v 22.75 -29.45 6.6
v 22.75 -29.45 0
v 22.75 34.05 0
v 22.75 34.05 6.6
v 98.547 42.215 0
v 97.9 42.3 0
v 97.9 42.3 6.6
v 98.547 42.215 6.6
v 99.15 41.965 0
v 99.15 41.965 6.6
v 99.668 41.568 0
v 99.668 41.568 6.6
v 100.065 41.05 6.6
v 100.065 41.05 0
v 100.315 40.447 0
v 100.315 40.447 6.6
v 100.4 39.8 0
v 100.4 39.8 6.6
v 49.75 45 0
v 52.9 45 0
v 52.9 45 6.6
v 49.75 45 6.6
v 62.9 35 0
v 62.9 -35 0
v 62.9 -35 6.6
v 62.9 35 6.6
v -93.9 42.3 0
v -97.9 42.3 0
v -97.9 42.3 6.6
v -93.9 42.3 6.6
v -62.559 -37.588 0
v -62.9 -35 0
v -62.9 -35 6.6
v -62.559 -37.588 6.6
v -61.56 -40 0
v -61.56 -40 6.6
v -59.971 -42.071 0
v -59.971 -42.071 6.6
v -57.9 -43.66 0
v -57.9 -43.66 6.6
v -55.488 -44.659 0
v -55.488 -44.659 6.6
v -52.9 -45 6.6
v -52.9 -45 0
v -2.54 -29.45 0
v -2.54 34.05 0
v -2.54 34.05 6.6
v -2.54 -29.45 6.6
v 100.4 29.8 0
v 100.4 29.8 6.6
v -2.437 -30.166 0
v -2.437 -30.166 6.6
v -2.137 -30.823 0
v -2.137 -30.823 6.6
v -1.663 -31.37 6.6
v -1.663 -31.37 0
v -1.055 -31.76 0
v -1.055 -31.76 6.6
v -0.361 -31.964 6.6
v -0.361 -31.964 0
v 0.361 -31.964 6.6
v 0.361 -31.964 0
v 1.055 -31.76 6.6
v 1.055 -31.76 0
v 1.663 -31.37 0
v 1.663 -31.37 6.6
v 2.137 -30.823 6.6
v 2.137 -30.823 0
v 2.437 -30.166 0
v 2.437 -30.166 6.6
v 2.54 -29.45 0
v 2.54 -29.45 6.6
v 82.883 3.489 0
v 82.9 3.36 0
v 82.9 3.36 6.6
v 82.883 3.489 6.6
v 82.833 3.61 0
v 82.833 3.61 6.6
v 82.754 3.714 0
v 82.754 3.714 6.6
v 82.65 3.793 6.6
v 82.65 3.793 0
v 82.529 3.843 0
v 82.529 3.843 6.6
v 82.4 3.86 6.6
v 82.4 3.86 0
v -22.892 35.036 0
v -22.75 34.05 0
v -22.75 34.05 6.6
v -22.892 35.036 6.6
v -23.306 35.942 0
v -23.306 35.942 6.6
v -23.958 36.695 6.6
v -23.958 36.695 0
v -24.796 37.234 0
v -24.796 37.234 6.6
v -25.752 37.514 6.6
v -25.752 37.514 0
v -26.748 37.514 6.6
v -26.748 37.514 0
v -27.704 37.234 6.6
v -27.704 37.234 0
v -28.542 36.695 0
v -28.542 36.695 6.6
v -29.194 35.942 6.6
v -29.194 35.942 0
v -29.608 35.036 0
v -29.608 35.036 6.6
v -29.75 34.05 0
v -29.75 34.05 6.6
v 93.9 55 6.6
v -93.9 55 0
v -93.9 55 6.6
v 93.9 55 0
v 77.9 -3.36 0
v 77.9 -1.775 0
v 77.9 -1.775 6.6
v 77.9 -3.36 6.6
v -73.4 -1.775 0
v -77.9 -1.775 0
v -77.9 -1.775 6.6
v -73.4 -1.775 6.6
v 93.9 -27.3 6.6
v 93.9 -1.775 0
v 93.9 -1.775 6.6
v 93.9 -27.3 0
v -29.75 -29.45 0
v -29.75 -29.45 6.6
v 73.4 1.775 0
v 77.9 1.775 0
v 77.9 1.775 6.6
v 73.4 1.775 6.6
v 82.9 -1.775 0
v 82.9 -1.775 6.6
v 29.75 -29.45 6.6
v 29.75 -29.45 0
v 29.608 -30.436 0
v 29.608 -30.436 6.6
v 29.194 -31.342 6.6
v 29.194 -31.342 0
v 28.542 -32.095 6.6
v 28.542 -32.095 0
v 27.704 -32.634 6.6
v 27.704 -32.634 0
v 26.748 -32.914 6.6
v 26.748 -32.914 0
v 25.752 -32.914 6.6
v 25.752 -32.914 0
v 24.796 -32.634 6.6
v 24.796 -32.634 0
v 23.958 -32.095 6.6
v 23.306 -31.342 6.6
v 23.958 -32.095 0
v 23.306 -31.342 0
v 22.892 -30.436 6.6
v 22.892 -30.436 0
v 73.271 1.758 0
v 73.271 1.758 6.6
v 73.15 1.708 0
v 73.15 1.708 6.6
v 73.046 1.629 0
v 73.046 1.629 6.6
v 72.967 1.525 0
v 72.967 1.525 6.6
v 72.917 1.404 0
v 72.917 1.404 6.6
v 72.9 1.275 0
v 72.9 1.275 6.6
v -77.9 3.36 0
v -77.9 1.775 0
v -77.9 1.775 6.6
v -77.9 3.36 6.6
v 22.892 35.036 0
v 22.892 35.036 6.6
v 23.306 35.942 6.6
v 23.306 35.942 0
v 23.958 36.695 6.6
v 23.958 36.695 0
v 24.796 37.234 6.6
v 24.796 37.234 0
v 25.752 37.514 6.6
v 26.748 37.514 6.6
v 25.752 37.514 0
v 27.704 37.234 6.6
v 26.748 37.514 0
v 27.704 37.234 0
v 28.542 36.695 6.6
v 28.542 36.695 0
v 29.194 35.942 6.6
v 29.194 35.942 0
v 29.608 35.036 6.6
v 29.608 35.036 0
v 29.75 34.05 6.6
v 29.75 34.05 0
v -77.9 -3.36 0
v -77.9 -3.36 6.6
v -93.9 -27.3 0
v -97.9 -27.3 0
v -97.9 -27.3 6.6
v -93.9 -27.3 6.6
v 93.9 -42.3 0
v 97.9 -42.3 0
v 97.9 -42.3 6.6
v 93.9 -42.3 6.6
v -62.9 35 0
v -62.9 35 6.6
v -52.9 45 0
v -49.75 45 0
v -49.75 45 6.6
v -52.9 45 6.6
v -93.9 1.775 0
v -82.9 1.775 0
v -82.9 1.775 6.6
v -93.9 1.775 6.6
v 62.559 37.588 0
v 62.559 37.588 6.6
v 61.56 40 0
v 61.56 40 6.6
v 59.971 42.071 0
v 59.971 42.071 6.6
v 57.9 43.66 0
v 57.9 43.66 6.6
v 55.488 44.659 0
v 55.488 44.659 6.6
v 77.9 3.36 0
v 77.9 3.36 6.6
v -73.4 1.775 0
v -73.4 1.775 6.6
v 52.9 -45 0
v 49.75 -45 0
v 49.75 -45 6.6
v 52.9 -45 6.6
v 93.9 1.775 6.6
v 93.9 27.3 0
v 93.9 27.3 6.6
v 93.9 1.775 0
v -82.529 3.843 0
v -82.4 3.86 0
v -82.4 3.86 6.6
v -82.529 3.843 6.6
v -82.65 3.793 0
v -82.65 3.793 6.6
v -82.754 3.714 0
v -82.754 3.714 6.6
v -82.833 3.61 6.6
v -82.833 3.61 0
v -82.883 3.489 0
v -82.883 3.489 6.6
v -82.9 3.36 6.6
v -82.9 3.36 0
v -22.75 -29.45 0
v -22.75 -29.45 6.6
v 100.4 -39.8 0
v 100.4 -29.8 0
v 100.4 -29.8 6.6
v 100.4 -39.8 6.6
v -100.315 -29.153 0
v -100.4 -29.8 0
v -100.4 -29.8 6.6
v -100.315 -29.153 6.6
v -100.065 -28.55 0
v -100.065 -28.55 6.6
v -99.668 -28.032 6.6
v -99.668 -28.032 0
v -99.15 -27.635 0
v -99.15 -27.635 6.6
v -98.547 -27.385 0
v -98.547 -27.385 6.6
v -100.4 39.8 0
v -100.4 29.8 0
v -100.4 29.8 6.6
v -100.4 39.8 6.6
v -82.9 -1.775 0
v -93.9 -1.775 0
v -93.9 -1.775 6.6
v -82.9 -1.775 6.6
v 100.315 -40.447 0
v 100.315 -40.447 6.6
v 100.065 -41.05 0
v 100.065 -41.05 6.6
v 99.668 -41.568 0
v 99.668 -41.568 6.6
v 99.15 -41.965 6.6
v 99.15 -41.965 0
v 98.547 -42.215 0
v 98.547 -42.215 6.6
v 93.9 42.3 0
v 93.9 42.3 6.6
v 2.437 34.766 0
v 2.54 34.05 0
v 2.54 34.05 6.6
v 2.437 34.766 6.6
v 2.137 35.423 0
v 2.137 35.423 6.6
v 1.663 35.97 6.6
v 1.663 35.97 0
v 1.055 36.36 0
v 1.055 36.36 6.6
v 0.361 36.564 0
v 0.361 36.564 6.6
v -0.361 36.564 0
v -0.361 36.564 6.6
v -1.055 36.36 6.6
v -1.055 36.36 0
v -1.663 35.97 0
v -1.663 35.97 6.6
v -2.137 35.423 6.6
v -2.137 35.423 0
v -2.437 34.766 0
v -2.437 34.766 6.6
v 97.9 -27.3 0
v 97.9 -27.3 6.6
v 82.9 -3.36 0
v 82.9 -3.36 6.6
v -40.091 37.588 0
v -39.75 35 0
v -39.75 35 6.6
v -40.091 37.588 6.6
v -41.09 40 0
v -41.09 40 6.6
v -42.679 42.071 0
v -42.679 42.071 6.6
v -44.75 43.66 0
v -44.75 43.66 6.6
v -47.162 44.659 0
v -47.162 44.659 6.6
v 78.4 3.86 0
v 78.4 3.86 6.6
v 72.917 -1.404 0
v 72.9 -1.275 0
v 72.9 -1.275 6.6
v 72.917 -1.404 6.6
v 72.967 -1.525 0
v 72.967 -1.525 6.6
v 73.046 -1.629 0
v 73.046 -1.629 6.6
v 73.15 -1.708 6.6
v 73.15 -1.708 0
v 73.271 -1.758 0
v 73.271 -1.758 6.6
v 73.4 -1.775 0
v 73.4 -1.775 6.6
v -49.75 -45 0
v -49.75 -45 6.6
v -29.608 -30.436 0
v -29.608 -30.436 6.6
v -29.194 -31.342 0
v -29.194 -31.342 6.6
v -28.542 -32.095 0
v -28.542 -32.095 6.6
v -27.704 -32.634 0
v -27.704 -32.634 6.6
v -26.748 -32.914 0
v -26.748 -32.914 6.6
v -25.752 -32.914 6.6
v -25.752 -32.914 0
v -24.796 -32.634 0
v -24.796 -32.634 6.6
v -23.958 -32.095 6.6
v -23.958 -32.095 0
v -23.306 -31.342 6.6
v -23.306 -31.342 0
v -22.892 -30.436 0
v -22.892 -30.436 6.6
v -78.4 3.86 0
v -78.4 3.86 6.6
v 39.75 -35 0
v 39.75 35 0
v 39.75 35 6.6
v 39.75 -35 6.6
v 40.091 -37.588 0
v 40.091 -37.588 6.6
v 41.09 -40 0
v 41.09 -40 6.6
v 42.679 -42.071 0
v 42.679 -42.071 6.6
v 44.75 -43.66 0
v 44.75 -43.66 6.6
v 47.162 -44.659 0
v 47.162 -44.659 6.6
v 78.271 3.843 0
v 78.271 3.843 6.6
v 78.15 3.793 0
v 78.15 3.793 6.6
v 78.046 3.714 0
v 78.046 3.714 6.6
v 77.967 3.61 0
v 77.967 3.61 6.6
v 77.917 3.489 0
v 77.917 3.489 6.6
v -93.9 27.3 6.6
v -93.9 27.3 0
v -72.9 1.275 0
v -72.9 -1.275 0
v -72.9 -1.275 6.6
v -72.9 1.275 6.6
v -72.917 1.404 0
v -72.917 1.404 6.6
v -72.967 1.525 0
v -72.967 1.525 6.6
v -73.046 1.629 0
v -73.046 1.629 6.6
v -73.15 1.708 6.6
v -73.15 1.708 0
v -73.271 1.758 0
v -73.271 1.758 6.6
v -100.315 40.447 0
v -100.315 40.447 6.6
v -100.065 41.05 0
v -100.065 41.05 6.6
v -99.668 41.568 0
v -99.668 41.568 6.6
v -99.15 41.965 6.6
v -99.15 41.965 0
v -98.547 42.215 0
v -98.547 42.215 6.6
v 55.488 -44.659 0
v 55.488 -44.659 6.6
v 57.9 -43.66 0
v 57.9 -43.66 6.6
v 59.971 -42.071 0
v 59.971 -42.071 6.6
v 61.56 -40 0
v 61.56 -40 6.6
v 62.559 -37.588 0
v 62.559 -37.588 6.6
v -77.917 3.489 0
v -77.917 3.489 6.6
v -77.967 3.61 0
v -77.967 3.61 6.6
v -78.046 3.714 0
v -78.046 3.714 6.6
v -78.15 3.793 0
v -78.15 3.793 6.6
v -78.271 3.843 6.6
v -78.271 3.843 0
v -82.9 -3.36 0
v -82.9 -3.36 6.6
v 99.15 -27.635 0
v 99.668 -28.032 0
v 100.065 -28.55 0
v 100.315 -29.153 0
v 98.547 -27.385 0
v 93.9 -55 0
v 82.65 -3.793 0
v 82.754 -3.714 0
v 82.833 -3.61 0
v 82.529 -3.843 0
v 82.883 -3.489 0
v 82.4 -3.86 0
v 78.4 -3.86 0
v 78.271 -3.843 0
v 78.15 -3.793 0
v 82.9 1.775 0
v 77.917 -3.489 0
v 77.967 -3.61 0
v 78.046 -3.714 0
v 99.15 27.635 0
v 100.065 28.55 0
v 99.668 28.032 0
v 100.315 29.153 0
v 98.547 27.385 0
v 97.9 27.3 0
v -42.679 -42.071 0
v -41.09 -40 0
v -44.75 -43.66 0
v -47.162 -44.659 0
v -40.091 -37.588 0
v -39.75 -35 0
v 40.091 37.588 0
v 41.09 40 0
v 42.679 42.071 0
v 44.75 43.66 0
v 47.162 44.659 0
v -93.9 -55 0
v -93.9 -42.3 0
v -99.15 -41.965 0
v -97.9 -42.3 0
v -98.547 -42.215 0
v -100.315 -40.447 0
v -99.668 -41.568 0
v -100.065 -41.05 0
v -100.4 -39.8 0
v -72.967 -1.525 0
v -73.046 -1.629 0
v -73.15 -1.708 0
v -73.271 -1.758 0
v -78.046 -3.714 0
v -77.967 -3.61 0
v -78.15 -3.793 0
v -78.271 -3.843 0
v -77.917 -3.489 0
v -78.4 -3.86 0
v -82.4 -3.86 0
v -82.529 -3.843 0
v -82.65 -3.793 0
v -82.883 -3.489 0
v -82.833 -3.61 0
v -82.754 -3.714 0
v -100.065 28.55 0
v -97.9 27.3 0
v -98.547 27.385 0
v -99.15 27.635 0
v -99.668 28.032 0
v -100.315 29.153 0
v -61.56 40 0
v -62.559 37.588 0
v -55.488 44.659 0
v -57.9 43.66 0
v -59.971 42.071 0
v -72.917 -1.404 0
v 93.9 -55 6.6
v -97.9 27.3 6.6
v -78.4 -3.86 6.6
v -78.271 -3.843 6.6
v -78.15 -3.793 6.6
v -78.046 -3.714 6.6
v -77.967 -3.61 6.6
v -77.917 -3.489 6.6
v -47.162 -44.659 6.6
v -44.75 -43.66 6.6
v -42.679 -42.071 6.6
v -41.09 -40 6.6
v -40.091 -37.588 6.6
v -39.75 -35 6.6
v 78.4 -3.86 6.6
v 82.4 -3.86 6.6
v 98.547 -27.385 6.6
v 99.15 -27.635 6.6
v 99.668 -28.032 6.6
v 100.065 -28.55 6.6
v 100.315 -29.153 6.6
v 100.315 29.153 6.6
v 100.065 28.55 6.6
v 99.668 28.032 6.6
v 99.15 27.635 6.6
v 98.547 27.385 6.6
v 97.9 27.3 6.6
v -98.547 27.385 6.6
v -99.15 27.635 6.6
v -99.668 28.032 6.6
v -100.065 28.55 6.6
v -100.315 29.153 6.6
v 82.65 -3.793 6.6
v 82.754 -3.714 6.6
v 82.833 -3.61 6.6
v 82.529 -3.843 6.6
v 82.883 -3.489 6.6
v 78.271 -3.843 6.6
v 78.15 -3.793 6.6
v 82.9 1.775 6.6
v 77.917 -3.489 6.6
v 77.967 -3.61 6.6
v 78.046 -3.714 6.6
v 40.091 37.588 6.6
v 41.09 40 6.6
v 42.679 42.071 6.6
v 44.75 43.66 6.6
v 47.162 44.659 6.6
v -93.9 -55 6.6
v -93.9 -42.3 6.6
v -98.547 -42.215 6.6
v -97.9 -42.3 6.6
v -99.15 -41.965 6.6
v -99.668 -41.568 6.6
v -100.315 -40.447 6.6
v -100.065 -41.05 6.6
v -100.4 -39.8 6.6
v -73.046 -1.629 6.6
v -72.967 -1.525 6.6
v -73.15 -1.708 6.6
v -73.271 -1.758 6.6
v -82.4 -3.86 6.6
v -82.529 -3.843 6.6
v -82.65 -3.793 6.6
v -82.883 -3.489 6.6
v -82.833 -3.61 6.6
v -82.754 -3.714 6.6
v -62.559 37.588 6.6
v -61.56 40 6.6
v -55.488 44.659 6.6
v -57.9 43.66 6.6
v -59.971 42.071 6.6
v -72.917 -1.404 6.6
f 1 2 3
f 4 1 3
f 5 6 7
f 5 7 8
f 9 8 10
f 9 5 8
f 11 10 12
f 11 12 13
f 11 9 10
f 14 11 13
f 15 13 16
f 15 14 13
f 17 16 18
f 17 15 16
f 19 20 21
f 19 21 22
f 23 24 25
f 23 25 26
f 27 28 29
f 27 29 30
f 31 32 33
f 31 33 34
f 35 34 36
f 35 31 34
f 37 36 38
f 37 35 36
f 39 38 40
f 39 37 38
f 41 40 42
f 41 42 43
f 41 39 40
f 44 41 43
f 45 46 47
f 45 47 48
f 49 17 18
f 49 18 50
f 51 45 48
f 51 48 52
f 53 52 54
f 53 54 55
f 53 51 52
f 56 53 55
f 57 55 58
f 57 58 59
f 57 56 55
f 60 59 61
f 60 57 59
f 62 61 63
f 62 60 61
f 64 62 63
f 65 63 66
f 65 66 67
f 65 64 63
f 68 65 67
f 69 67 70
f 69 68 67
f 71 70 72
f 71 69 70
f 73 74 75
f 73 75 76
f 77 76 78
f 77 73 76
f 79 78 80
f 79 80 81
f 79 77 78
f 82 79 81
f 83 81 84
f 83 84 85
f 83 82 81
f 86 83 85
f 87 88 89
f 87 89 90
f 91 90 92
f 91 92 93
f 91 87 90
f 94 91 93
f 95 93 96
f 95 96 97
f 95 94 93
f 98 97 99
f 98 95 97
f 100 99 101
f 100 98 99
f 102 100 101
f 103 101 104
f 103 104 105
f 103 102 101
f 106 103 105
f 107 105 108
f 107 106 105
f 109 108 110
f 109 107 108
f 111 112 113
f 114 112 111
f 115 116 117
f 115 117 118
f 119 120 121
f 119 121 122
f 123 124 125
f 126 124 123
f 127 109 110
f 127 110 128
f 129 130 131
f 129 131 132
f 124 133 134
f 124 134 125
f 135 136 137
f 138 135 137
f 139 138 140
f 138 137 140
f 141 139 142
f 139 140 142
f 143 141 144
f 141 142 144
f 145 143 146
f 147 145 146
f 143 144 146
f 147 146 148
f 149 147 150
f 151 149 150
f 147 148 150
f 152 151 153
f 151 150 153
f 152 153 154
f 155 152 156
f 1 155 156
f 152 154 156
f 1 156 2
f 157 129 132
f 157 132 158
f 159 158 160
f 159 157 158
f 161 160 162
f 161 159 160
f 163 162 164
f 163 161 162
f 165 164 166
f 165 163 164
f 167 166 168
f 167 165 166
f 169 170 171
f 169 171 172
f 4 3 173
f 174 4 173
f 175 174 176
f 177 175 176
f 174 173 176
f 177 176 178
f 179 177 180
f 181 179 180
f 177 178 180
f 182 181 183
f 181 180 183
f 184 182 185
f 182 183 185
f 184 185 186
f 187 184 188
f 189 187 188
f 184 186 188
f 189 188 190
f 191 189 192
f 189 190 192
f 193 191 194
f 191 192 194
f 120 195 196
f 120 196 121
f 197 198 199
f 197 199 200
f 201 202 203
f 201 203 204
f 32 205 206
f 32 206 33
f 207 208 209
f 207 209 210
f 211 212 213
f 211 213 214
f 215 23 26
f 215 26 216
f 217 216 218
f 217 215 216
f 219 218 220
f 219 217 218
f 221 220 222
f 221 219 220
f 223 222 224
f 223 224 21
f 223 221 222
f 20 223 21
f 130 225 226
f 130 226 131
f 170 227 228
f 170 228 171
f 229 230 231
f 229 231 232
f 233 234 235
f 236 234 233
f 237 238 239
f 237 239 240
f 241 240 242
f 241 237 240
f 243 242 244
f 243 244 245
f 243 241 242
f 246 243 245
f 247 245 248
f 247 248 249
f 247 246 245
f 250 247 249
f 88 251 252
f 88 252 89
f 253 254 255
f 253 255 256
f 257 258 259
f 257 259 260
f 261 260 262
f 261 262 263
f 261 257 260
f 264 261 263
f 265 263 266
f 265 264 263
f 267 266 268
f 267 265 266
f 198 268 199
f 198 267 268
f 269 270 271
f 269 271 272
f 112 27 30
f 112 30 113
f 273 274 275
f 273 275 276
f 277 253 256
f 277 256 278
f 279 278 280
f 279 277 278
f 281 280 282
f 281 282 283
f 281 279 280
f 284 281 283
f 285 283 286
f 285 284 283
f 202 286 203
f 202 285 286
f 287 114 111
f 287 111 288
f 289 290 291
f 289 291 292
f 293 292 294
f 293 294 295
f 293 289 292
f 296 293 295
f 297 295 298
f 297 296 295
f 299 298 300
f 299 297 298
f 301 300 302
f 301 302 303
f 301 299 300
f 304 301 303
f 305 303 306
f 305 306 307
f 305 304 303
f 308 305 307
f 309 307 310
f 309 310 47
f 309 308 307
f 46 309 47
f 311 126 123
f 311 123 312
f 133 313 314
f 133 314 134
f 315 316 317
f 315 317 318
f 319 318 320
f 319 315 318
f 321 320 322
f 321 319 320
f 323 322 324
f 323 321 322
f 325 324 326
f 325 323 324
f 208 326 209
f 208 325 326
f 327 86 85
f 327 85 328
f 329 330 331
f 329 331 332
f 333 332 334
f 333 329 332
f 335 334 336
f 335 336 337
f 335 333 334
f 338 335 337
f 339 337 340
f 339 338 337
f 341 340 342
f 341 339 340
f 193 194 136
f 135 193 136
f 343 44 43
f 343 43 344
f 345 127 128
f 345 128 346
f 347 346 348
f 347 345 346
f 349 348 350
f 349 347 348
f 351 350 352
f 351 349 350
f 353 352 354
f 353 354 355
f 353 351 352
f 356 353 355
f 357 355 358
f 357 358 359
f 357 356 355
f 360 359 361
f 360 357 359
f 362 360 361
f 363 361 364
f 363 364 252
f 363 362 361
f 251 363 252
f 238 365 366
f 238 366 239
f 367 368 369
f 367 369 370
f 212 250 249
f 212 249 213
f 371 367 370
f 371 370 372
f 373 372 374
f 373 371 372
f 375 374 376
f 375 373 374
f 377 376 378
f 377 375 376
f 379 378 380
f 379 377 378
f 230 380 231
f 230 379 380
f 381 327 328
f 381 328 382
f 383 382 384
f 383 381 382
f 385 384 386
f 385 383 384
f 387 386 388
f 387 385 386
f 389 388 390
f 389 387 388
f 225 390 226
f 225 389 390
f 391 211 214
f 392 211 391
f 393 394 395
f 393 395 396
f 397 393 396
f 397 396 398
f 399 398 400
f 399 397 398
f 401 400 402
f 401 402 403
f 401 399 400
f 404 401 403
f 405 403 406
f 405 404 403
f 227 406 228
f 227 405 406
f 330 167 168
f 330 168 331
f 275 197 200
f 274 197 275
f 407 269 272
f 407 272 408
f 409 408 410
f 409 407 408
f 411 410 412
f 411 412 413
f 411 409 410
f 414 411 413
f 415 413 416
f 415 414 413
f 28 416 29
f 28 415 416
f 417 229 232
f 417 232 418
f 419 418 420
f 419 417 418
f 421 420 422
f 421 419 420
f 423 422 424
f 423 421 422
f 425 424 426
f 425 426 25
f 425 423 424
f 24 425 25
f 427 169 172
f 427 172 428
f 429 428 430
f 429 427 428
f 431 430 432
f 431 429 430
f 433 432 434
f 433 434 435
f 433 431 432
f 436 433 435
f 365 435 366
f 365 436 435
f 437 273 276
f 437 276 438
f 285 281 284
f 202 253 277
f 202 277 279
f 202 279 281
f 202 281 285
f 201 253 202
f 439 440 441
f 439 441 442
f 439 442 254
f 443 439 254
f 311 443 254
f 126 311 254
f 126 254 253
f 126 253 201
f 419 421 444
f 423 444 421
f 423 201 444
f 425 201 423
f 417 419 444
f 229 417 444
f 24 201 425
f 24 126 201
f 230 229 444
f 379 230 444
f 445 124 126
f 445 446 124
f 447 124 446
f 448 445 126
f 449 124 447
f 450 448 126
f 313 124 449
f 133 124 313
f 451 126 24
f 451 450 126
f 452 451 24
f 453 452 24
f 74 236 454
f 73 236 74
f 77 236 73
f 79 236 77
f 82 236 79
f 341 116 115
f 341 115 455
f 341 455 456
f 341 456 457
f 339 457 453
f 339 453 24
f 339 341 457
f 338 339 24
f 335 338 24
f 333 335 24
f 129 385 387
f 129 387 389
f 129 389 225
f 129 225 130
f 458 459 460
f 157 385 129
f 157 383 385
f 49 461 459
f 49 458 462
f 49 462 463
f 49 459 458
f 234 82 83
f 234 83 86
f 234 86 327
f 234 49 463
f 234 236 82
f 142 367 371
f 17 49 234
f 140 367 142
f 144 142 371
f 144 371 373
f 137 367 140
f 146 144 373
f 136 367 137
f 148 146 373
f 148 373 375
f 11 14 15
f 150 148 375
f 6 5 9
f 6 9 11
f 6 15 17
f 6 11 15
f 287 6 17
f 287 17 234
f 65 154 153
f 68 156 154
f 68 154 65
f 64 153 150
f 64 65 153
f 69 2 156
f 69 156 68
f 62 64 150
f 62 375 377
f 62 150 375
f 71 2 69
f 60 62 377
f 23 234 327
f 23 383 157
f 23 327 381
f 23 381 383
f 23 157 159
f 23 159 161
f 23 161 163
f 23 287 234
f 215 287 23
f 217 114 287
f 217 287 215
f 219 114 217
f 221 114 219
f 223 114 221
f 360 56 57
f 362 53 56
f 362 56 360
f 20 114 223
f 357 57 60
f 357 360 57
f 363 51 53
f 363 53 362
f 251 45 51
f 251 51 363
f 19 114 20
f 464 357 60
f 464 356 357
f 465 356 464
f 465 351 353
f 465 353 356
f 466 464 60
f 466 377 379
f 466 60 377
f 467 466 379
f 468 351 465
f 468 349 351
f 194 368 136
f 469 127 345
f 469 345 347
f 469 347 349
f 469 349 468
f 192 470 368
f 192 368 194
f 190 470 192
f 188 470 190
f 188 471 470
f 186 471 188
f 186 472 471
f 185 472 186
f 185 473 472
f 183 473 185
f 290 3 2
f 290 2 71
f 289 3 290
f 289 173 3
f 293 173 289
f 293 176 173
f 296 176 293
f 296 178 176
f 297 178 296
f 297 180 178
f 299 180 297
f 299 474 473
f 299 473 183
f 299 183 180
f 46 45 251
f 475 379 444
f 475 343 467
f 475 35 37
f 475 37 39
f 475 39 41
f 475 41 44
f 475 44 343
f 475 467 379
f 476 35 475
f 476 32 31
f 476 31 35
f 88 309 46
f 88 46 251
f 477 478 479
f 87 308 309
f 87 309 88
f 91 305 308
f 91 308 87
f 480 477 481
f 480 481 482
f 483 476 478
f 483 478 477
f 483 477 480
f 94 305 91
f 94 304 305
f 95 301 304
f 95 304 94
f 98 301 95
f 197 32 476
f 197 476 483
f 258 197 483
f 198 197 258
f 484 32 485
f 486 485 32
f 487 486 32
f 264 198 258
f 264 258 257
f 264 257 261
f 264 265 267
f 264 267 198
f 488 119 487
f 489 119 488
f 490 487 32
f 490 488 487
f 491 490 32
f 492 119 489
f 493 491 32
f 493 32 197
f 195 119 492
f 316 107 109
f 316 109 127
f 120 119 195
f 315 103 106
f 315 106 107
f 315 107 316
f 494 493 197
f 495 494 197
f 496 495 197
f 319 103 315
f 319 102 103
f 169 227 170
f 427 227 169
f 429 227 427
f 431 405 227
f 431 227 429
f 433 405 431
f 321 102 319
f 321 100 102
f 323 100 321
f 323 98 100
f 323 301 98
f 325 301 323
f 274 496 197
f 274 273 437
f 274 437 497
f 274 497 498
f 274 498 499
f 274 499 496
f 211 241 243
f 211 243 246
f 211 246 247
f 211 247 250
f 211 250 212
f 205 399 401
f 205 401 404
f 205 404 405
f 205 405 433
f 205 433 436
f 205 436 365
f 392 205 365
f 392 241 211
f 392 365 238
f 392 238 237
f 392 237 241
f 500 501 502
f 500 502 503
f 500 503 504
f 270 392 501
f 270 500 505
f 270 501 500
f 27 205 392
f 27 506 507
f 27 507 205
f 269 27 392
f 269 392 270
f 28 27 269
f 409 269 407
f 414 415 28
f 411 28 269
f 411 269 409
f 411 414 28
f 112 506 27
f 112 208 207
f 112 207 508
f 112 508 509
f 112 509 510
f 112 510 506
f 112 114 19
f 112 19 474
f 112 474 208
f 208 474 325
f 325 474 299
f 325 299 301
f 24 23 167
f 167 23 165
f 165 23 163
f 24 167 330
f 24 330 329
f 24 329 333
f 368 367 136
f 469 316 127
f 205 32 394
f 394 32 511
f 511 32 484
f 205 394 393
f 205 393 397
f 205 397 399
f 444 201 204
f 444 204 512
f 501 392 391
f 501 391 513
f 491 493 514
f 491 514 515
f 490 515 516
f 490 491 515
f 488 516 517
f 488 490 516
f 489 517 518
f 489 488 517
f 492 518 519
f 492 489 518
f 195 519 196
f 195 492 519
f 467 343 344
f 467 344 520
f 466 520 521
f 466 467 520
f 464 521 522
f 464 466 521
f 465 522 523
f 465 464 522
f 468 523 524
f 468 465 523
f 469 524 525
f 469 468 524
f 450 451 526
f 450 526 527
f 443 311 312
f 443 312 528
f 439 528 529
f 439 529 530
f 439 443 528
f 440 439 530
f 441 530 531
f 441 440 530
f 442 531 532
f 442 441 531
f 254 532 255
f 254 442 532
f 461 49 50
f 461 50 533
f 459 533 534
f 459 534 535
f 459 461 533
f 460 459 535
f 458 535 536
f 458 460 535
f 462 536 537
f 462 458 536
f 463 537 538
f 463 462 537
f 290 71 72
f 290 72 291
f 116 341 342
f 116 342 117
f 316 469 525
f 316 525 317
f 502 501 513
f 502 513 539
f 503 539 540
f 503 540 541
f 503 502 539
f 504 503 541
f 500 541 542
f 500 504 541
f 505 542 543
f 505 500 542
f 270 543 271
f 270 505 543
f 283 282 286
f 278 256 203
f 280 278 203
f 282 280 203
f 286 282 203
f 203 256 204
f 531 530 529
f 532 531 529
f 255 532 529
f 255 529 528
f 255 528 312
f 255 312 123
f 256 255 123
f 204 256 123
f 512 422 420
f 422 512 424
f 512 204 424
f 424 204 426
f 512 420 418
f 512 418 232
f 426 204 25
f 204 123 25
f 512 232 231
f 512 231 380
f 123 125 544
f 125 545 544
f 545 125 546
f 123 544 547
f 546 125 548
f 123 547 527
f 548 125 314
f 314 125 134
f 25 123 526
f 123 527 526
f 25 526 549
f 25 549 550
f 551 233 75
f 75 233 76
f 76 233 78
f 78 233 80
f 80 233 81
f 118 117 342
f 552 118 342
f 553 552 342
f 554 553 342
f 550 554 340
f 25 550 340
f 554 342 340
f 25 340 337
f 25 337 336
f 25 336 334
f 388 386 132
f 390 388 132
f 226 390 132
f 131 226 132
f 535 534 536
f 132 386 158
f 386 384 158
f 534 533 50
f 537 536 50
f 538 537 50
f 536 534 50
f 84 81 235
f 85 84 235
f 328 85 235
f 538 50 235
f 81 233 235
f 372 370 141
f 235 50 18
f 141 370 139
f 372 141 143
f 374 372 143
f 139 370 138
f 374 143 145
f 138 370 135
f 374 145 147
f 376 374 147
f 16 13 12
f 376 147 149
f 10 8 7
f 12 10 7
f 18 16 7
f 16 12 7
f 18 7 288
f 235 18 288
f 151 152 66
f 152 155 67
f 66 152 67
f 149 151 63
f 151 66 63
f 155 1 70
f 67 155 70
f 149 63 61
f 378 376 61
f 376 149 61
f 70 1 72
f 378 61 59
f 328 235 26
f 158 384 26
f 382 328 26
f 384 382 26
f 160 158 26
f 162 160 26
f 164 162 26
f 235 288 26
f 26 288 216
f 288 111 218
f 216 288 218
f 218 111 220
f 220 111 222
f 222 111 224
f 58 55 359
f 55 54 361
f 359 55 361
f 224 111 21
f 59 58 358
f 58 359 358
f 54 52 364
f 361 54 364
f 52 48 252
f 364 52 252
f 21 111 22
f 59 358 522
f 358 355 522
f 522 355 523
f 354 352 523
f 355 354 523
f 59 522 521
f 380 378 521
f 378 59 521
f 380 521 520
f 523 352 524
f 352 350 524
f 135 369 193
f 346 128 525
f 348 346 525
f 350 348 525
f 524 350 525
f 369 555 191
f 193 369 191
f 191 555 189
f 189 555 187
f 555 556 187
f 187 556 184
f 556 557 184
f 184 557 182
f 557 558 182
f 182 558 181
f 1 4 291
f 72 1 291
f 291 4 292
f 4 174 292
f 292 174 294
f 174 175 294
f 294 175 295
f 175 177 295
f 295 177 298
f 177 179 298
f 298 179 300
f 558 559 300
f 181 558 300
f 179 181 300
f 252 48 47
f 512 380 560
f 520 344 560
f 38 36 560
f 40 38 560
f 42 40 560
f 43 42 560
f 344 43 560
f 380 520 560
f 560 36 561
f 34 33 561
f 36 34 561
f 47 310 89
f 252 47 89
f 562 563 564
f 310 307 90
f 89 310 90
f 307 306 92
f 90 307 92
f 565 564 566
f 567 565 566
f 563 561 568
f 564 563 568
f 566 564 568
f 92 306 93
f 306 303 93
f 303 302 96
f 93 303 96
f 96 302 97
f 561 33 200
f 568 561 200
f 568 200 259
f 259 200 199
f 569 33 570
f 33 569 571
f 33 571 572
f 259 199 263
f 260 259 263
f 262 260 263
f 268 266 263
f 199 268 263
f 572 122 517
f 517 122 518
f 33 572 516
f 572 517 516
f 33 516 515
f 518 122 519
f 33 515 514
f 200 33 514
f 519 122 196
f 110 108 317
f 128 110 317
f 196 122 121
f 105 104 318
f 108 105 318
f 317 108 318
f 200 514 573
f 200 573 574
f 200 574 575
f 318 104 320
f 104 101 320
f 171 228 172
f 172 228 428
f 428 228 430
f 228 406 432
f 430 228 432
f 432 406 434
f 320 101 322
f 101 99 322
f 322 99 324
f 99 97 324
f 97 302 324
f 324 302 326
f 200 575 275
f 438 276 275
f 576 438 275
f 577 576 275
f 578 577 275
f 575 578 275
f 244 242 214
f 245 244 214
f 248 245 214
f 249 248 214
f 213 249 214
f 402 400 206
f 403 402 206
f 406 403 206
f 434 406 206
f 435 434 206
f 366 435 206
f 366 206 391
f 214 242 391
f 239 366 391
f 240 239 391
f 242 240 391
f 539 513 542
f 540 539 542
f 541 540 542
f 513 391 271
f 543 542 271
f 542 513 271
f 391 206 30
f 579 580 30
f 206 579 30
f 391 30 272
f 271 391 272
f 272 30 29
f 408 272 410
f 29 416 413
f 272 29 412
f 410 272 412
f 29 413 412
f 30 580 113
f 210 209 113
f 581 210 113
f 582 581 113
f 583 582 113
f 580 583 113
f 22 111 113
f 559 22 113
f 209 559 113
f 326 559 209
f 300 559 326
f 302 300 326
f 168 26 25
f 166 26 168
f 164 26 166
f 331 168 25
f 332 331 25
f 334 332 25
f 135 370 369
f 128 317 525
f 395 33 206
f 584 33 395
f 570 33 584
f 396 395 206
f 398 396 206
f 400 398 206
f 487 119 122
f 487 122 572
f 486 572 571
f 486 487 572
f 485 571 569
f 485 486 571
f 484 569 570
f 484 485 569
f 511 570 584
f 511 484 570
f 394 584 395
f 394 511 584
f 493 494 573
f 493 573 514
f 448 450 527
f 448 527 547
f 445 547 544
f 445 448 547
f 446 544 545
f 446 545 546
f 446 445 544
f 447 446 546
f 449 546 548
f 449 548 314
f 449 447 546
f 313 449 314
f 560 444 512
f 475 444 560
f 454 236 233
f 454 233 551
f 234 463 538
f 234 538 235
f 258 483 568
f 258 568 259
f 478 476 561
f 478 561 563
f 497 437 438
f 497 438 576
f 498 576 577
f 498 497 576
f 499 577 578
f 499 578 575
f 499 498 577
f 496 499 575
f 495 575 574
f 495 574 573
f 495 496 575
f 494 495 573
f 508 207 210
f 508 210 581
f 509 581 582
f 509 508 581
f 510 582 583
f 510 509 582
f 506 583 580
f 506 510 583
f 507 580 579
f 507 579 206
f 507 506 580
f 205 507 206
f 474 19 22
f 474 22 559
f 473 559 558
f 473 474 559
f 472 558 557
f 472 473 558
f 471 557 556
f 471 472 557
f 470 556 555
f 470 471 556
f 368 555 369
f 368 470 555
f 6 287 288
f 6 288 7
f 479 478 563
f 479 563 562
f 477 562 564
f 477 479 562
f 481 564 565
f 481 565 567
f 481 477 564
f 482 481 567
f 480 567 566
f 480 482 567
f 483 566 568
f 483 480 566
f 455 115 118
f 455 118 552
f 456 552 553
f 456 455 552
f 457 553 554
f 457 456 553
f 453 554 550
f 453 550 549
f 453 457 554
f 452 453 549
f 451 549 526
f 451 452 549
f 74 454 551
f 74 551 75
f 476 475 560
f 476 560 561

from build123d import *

# Parameters (mm, degrees)
BOSS_EXTRUDE1_DEPTH = 6.6


with BuildPart() as part:
    # Model → Boss-Extrude1 (new body)
    with BuildSketch(Plane.XY):
        with BuildLine():
            Line((72.9, 1.275), (72.9, -1.275))
            ThreePointArc((72.9, -1.275), (73.046446609, -1.628553391), (73.4, -1.775))
            Line((73.4, -1.775), (77.9, -1.775))
            Line((77.9, -1.775), (77.9, -3.36))
            ThreePointArc((77.9, -3.36), (78.046446609, -3.713553391), (78.4, -3.86))
            Line((78.4, -3.86), (82.4, -3.86))
            ThreePointArc((82.4, -3.86), (82.753553391, -3.713553391), (82.9, -3.36))
            Line((82.9, -3.36), (82.9, -1.775))
            Line((82.9, -1.775), (93.9, -1.775))
            Line((93.9, -1.775), (93.9, -27.3))
            Line((93.9, -27.3), (97.9, -27.3))
            ThreePointArc((97.9, -27.3), (99.667766953, -28.032233047), (100.4, -29.8))
            Line((100.4, -29.8), (100.4, -39.8))
            ThreePointArc((100.4, -39.8), (99.667766953, -41.567766953), (97.9, -42.3))
            Line((97.9, -42.3), (93.9, -42.3))
            Line((93.9, -42.3), (93.9, -55))
            Line((93.9, -55), (-93.9, -55))
            Line((-93.9, -55), (-93.9, -42.3))
            Line((-93.9, -42.3), (-97.9, -42.3))
            ThreePointArc((-97.9, -42.3), (-99.667766953, -41.567766953), (-100.4, -39.8))
            Line((-100.4, -39.8), (-100.4, -29.8))
            ThreePointArc((-100.4, -29.8), (-99.667766953, -28.032233047), (-97.9, -27.3))
            Line((-97.9, -27.3), (-93.9, -27.3))
            Line((-93.9, -27.3), (-93.9, -1.775))
            Line((-93.9, -1.775), (-82.9, -1.775))
            Line((-82.9, -1.775), (-82.9, -3.36))
            ThreePointArc((-82.9, -3.36), (-82.753553391, -3.713553391), (-82.4, -3.86))
            Line((-82.4, -3.86), (-78.4, -3.86))
            ThreePointArc((-78.4, -3.86), (-78.046446609, -3.713553391), (-77.9, -3.36))
            Line((-77.9, -3.36), (-77.9, -1.775))
            Line((-77.9, -1.775), (-73.4, -1.775))
            ThreePointArc((-73.4, -1.775), (-73.046446609, -1.628553391), (-72.9, -1.275))
            Line((-72.9, -1.275), (-72.9, 1.275))
            ThreePointArc((-72.9, 1.275), (-73.046446609, 1.628553391), (-73.4, 1.775))
            Line((-73.4, 1.775), (-77.9, 1.775))
            Line((-77.9, 1.775), (-77.9, 3.36))
            ThreePointArc((-77.9, 3.36), (-78.046446609, 3.713553391), (-78.4, 3.86))
            Line((-78.4, 3.86), (-82.4, 3.86))
            ThreePointArc((-82.4, 3.86), (-82.753553391, 3.713553391), (-82.9, 3.36))
            Line((-82.9, 3.36), (-82.9, 1.775))
            Line((-82.9, 1.775), (-93.9, 1.775))
            Line((-93.9, 1.775), (-93.9, 27.3))
            Line((-93.9, 27.3), (-97.9, 27.3))
            ThreePointArc((-97.9, 27.3), (-99.667766953, 28.032233047), (-100.4, 29.8))
            Line((-100.4, 29.8), (-100.4, 39.8))
            ThreePointArc((-100.4, 39.8), (-99.667766953, 41.567766953), (-97.9, 42.3))
            Line((-97.9, 42.3), (-93.9, 42.3))
            Line((-93.9, 42.3), (-93.9, 55))
            Line((-93.9, 55), (93.9, 55))
            Line((93.9, 55), (93.9, 42.3))
            Line((93.9, 42.3), (97.9, 42.3))
            ThreePointArc((97.9, 42.3), (99.667766953, 41.567766953), (100.4, 39.8))
            Line((100.4, 39.8), (100.4, 29.8))
            ThreePointArc((100.4, 29.8), (99.667766953, 28.032233047), (97.9, 27.3))
            Line((97.9, 27.3), (93.9, 27.3))
            Line((93.9, 27.3), (93.9, 1.775))
            Line((93.9, 1.775), (82.9, 1.775))
            Line((82.9, 1.775), (82.9, 3.36))
            ThreePointArc((82.9, 3.36), (82.753553391, 3.713553391), (82.4, 3.86))
            Line((82.4, 3.86), (78.4, 3.86))
            ThreePointArc((78.4, 3.86), (78.046446609, 3.713553391), (77.9, 3.36))
            Line((77.9, 3.36), (77.9, 1.775))
            Line((77.9, 1.775), (73.4, 1.775))
            ThreePointArc((73.4, 1.775), (73.046446609, 1.628553391), (72.9, 1.275))
        make_face()
        with BuildLine():
            Line((29.75, 34.05), (29.75, -29.45))
            ThreePointArc((29.75, -29.45), (26.25, -32.95), (22.75, -29.45))
            Line((22.75, -29.45), (22.75, 34.05))
            ThreePointArc((22.75, 34.05), (26.25, 37.55), (29.75, 34.05))
        make_face(mode=Mode.SUBTRACT)
        with BuildLine():
            Line((-29.75, 34.05), (-29.75, -29.45))
            ThreePointArc((-29.75, -29.45), (-26.25, -32.95), (-22.75, -29.45))
            Line((-22.75, -29.45), (-22.75, 34.05))
            ThreePointArc((-22.75, 34.05), (-26.25, 37.55), (-29.75, 34.05))
        make_face(mode=Mode.SUBTRACT)
        with BuildLine():
            Line((2.54, -29.45), (2.54, 34.05))
            ThreePointArc((2.54, 34.05), (0, 36.59), (-2.54, 34.05))
            Line((-2.54, 34.05), (-2.54, -29.45))
            ThreePointArc((-2.54, -29.45), (0, -31.99), (2.54, -29.45))
        make_face(mode=Mode.SUBTRACT)
        with BuildLine():
            Line((-39.75, -35), (-39.75, 35))
            ThreePointArc((-39.75, 35), (-42.678932188, 42.071067812), (-49.75, 45))
            Line((-49.75, 45), (-52.9, 45))
            ThreePointArc((-52.9, 45), (-59.971067812, 42.071067812), (-62.9, 35))
            Line((-62.9, 35), (-62.9, -35))
            ThreePointArc((-62.9, -35), (-59.971067812, -42.071067812), (-52.9, -45))
            Line((-52.9, -45), (-49.75, -45))
            ThreePointArc((-49.75, -45), (-42.678932188, -42.071067812), (-39.75, -35))
        make_face(mode=Mode.SUBTRACT)
        with BuildLine():
            Line((62.9, -35), (62.9, 35))
            ThreePointArc((62.9, 35), (59.971067812, 42.071067812), (52.9, 45))
            Line((52.9, 45), (49.75, 45))
            ThreePointArc((49.75, 45), (42.678932188, 42.071067812), (39.75, 35))
            Line((39.75, 35), (39.75, -35))
            ThreePointArc((39.75, -35), (42.678932188, -42.071067812), (49.75, -45))
            Line((49.75, -45), (52.9, -45))
            ThreePointArc((52.9, -45), (59.971067812, -42.071067812), (62.9, -35))
        make_face(mode=Mode.SUBTRACT)
    extrude(amount=BOSS_EXTRUDE1_DEPTH)


solid = part.part
